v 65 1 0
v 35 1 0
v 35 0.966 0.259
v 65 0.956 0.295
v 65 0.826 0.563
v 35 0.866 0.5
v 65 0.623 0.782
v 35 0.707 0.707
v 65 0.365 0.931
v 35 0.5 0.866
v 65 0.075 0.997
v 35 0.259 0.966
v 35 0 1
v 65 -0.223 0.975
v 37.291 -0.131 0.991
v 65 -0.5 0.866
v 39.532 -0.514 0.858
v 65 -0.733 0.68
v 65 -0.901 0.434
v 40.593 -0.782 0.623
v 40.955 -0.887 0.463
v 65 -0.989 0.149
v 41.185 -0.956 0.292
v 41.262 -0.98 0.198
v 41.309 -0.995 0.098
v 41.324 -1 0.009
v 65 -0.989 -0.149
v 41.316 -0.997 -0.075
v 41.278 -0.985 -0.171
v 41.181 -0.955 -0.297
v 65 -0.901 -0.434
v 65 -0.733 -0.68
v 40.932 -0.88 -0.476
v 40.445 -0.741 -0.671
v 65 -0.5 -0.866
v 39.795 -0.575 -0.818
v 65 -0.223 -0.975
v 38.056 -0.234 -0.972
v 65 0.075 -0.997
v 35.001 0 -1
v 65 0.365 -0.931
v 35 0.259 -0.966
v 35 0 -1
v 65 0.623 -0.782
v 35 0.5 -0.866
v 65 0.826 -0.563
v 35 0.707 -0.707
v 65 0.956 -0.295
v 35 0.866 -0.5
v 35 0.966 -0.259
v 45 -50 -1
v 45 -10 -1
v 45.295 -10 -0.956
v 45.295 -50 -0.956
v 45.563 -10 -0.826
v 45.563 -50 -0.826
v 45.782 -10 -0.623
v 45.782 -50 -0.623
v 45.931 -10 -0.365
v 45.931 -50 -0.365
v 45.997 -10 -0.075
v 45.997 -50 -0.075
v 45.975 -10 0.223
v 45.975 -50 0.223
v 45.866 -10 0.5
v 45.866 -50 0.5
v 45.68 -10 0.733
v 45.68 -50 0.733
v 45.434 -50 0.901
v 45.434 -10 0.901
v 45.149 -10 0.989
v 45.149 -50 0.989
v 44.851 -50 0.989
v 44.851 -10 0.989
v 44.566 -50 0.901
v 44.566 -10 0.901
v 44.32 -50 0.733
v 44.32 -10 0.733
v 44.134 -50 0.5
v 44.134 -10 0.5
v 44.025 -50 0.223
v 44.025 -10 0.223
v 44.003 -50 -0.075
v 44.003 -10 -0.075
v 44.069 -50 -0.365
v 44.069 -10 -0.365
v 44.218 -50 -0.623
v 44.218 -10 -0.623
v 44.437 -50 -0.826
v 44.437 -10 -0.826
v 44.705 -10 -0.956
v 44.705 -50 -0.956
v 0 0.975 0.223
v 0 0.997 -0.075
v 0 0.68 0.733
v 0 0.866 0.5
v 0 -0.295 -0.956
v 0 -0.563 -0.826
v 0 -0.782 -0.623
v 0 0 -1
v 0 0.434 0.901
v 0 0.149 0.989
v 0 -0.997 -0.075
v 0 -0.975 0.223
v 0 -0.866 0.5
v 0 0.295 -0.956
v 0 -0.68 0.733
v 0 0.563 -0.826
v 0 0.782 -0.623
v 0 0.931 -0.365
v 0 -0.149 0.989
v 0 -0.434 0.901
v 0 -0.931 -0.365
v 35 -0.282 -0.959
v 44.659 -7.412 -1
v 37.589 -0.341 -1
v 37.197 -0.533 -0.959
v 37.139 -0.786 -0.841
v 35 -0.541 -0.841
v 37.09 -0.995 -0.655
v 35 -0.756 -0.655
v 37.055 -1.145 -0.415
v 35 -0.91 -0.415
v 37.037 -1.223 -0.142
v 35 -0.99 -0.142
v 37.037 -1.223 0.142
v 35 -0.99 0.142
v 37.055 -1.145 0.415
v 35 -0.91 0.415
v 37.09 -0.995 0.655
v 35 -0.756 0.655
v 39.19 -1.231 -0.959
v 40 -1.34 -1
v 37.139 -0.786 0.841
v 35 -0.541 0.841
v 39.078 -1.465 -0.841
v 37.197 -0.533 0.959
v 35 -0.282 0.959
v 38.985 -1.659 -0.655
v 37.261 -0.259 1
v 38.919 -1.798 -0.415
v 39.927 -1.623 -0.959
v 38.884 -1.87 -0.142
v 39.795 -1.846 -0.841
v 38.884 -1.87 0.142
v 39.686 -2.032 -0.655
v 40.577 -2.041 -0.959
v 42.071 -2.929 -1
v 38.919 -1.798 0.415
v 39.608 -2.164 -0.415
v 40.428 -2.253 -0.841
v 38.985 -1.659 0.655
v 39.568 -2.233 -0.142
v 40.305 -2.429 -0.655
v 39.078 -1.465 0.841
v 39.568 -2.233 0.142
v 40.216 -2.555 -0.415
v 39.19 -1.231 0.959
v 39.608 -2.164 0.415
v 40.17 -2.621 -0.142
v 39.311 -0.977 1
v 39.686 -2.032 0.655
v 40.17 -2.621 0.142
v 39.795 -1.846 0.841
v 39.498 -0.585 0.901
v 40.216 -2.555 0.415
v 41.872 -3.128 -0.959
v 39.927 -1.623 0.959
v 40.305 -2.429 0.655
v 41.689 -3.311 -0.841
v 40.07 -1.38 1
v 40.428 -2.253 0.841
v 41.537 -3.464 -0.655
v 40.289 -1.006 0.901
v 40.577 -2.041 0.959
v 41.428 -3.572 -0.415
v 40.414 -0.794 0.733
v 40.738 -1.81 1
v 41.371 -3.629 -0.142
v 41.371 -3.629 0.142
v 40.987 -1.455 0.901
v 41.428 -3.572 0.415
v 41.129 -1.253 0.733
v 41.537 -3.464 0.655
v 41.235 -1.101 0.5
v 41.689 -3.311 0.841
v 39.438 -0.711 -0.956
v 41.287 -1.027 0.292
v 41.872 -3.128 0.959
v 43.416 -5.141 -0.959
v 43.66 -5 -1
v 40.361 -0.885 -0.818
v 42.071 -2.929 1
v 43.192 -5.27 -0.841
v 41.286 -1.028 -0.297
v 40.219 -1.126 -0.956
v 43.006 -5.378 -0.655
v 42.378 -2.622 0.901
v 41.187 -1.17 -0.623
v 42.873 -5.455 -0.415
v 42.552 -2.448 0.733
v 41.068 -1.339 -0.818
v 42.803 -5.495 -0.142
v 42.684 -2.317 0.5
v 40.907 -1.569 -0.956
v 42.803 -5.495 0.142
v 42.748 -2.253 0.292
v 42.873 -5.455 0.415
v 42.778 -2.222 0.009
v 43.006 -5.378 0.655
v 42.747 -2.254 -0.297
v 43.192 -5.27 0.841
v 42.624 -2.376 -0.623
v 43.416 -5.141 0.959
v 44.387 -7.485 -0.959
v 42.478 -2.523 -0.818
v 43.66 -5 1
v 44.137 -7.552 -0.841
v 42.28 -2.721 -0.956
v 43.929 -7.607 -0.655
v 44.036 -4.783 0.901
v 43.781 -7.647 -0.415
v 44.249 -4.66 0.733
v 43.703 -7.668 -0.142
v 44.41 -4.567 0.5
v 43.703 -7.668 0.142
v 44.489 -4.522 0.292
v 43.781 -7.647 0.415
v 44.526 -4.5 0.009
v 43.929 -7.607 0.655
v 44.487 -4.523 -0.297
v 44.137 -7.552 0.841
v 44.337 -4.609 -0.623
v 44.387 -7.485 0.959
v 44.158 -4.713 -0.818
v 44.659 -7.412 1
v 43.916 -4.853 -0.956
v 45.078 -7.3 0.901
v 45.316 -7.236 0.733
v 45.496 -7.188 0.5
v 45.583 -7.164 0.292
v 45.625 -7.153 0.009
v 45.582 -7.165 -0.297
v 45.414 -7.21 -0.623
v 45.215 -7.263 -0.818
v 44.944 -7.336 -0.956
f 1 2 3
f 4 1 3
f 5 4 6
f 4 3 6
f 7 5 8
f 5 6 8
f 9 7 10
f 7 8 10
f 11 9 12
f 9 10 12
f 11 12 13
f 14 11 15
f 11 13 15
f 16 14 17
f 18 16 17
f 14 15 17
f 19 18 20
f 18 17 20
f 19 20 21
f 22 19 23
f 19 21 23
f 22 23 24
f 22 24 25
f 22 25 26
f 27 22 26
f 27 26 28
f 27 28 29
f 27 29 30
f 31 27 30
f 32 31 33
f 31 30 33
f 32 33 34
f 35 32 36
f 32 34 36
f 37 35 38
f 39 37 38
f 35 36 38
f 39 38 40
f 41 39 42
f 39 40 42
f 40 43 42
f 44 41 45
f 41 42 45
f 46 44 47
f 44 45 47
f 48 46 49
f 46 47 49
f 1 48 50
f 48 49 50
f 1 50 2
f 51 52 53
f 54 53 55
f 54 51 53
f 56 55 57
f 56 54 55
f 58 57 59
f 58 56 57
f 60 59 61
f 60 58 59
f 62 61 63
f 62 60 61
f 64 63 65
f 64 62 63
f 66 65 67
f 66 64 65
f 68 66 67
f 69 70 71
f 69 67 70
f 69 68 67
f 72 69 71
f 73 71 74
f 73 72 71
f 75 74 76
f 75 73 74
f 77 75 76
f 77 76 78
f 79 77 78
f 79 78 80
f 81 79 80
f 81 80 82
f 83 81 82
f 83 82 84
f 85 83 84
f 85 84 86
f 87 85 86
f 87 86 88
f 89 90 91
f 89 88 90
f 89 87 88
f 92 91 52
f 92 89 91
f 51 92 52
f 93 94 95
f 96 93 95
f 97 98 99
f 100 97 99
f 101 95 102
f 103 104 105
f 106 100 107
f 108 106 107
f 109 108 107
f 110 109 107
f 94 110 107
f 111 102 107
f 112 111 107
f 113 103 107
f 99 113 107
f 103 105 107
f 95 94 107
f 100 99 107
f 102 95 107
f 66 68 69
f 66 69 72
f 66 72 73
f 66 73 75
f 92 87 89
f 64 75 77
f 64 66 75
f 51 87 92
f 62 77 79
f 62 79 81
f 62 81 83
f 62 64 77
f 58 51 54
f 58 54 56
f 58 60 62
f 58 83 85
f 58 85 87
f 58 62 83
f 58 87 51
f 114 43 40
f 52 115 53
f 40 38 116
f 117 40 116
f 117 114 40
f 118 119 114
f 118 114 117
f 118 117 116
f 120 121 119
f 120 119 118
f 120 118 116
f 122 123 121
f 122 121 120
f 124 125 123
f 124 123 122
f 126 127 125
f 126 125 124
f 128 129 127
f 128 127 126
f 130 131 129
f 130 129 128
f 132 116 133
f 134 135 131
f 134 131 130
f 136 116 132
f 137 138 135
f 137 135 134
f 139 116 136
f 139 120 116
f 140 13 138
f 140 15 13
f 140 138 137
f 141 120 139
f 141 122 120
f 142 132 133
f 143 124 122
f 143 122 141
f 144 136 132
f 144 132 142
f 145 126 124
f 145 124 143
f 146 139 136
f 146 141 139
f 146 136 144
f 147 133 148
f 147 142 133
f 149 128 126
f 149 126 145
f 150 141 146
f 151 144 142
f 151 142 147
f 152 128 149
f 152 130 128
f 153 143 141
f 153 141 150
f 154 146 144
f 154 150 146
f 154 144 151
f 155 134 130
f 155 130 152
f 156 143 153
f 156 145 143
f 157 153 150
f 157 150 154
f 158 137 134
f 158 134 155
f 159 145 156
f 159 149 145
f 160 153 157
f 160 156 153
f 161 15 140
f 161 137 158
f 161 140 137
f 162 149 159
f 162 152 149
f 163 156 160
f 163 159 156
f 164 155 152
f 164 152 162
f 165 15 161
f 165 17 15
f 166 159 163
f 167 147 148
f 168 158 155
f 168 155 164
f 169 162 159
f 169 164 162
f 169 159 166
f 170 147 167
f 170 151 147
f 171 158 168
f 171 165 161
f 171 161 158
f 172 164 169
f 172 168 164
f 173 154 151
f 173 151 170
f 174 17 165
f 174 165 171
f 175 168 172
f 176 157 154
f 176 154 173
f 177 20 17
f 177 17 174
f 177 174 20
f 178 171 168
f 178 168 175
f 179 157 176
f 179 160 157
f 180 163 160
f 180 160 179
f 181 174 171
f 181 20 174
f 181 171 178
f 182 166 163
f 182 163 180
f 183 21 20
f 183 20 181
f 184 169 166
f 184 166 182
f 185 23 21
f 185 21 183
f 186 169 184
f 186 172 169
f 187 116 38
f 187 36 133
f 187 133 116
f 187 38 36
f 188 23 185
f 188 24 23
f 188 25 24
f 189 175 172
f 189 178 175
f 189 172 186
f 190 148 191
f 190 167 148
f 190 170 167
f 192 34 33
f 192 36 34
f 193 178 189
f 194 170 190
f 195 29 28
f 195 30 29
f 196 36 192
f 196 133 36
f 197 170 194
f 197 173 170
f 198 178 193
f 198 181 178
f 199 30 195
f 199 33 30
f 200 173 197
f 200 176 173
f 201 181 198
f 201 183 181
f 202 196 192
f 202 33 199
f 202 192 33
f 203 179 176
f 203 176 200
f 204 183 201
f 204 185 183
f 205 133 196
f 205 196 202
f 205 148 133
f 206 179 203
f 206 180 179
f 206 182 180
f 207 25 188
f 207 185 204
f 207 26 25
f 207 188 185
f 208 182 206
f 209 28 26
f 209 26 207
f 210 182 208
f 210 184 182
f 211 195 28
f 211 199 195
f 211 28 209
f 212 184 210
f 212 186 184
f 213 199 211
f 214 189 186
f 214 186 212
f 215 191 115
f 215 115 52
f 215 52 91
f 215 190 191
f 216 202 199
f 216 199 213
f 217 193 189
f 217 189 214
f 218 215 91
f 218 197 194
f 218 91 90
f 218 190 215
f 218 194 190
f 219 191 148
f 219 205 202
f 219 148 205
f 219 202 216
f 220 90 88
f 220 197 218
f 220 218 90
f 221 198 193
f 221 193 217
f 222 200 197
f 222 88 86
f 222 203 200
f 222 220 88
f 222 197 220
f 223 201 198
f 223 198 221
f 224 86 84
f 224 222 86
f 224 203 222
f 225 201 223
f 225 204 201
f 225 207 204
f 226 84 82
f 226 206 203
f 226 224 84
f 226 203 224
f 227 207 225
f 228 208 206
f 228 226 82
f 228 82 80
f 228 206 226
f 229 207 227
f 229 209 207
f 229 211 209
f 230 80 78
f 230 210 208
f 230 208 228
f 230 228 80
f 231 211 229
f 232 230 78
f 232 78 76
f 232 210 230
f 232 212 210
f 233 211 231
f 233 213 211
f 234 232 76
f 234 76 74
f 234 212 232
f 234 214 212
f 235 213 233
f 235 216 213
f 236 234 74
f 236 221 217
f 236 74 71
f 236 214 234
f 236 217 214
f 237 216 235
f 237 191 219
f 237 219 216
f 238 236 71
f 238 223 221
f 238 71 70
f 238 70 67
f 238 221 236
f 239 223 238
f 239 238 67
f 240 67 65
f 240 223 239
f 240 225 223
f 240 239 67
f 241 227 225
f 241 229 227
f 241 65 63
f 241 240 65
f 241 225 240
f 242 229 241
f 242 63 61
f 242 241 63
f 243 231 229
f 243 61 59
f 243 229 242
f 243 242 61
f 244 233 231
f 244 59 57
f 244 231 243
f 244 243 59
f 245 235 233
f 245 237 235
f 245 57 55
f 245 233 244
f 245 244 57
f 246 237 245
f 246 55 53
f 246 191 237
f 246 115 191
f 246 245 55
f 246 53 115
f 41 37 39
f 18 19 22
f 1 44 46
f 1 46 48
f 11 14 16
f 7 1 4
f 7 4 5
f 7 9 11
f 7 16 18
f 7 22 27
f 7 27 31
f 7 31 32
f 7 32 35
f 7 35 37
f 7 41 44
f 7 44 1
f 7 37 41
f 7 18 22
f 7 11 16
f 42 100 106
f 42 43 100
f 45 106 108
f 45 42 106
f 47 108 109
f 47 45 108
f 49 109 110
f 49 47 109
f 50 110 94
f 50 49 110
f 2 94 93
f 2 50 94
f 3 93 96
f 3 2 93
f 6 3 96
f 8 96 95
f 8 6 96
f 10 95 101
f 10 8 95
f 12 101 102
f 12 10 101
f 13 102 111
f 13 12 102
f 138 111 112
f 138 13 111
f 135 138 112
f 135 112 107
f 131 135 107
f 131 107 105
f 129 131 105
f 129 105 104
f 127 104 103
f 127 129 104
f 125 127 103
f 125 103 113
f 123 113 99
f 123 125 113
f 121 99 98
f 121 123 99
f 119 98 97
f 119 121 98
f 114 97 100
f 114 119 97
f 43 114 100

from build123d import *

# Parameters (mm, degrees)
SKETCH_3_R        = 1
SWEEP_START       = 35
SWEEP_6_OUTLINE_R = 1
SWEEP_6_DEPTH     = 30


# Read off the part's stored shape, not the designer's step: ｽｲｰﾌﾟ6
with BuildPart() as part:
    # ｽｲｰﾌﾟ3: sweep along a path in ｽｹｯﾁ4
    with BuildLine(Plane.XY) as sweep_3_path:
        Line((0, 0), (34.999999999999936, 0))
        ThreePointArc((34.999999999999936, 0), (42.071067811865476, -2.9289321881345254), (45, -10.000000000000066))
        Line((45, -10.000000000000066), (45.000000000000014, -50))
    # ｽｹｯﾁ3 → ｽｲｰﾌﾟ3 (sweep)
    with BuildSketch(Plane(origin=(0, 0, 0), x_dir=(0, 0, -1), z_dir=(1, 0, 0))):
        Circle(SKETCH_3_R)
    sweep(path=sweep_3_path.line)

    # ｽｲｰﾌﾟ6 outline → ｽｲｰﾌﾟ6 (add)
    with BuildSketch(Plane.YZ.offset(SWEEP_START)):
        Circle(SWEEP_6_OUTLINE_R)
    extrude(amount=SWEEP_6_DEPTH)


solid = part.part
